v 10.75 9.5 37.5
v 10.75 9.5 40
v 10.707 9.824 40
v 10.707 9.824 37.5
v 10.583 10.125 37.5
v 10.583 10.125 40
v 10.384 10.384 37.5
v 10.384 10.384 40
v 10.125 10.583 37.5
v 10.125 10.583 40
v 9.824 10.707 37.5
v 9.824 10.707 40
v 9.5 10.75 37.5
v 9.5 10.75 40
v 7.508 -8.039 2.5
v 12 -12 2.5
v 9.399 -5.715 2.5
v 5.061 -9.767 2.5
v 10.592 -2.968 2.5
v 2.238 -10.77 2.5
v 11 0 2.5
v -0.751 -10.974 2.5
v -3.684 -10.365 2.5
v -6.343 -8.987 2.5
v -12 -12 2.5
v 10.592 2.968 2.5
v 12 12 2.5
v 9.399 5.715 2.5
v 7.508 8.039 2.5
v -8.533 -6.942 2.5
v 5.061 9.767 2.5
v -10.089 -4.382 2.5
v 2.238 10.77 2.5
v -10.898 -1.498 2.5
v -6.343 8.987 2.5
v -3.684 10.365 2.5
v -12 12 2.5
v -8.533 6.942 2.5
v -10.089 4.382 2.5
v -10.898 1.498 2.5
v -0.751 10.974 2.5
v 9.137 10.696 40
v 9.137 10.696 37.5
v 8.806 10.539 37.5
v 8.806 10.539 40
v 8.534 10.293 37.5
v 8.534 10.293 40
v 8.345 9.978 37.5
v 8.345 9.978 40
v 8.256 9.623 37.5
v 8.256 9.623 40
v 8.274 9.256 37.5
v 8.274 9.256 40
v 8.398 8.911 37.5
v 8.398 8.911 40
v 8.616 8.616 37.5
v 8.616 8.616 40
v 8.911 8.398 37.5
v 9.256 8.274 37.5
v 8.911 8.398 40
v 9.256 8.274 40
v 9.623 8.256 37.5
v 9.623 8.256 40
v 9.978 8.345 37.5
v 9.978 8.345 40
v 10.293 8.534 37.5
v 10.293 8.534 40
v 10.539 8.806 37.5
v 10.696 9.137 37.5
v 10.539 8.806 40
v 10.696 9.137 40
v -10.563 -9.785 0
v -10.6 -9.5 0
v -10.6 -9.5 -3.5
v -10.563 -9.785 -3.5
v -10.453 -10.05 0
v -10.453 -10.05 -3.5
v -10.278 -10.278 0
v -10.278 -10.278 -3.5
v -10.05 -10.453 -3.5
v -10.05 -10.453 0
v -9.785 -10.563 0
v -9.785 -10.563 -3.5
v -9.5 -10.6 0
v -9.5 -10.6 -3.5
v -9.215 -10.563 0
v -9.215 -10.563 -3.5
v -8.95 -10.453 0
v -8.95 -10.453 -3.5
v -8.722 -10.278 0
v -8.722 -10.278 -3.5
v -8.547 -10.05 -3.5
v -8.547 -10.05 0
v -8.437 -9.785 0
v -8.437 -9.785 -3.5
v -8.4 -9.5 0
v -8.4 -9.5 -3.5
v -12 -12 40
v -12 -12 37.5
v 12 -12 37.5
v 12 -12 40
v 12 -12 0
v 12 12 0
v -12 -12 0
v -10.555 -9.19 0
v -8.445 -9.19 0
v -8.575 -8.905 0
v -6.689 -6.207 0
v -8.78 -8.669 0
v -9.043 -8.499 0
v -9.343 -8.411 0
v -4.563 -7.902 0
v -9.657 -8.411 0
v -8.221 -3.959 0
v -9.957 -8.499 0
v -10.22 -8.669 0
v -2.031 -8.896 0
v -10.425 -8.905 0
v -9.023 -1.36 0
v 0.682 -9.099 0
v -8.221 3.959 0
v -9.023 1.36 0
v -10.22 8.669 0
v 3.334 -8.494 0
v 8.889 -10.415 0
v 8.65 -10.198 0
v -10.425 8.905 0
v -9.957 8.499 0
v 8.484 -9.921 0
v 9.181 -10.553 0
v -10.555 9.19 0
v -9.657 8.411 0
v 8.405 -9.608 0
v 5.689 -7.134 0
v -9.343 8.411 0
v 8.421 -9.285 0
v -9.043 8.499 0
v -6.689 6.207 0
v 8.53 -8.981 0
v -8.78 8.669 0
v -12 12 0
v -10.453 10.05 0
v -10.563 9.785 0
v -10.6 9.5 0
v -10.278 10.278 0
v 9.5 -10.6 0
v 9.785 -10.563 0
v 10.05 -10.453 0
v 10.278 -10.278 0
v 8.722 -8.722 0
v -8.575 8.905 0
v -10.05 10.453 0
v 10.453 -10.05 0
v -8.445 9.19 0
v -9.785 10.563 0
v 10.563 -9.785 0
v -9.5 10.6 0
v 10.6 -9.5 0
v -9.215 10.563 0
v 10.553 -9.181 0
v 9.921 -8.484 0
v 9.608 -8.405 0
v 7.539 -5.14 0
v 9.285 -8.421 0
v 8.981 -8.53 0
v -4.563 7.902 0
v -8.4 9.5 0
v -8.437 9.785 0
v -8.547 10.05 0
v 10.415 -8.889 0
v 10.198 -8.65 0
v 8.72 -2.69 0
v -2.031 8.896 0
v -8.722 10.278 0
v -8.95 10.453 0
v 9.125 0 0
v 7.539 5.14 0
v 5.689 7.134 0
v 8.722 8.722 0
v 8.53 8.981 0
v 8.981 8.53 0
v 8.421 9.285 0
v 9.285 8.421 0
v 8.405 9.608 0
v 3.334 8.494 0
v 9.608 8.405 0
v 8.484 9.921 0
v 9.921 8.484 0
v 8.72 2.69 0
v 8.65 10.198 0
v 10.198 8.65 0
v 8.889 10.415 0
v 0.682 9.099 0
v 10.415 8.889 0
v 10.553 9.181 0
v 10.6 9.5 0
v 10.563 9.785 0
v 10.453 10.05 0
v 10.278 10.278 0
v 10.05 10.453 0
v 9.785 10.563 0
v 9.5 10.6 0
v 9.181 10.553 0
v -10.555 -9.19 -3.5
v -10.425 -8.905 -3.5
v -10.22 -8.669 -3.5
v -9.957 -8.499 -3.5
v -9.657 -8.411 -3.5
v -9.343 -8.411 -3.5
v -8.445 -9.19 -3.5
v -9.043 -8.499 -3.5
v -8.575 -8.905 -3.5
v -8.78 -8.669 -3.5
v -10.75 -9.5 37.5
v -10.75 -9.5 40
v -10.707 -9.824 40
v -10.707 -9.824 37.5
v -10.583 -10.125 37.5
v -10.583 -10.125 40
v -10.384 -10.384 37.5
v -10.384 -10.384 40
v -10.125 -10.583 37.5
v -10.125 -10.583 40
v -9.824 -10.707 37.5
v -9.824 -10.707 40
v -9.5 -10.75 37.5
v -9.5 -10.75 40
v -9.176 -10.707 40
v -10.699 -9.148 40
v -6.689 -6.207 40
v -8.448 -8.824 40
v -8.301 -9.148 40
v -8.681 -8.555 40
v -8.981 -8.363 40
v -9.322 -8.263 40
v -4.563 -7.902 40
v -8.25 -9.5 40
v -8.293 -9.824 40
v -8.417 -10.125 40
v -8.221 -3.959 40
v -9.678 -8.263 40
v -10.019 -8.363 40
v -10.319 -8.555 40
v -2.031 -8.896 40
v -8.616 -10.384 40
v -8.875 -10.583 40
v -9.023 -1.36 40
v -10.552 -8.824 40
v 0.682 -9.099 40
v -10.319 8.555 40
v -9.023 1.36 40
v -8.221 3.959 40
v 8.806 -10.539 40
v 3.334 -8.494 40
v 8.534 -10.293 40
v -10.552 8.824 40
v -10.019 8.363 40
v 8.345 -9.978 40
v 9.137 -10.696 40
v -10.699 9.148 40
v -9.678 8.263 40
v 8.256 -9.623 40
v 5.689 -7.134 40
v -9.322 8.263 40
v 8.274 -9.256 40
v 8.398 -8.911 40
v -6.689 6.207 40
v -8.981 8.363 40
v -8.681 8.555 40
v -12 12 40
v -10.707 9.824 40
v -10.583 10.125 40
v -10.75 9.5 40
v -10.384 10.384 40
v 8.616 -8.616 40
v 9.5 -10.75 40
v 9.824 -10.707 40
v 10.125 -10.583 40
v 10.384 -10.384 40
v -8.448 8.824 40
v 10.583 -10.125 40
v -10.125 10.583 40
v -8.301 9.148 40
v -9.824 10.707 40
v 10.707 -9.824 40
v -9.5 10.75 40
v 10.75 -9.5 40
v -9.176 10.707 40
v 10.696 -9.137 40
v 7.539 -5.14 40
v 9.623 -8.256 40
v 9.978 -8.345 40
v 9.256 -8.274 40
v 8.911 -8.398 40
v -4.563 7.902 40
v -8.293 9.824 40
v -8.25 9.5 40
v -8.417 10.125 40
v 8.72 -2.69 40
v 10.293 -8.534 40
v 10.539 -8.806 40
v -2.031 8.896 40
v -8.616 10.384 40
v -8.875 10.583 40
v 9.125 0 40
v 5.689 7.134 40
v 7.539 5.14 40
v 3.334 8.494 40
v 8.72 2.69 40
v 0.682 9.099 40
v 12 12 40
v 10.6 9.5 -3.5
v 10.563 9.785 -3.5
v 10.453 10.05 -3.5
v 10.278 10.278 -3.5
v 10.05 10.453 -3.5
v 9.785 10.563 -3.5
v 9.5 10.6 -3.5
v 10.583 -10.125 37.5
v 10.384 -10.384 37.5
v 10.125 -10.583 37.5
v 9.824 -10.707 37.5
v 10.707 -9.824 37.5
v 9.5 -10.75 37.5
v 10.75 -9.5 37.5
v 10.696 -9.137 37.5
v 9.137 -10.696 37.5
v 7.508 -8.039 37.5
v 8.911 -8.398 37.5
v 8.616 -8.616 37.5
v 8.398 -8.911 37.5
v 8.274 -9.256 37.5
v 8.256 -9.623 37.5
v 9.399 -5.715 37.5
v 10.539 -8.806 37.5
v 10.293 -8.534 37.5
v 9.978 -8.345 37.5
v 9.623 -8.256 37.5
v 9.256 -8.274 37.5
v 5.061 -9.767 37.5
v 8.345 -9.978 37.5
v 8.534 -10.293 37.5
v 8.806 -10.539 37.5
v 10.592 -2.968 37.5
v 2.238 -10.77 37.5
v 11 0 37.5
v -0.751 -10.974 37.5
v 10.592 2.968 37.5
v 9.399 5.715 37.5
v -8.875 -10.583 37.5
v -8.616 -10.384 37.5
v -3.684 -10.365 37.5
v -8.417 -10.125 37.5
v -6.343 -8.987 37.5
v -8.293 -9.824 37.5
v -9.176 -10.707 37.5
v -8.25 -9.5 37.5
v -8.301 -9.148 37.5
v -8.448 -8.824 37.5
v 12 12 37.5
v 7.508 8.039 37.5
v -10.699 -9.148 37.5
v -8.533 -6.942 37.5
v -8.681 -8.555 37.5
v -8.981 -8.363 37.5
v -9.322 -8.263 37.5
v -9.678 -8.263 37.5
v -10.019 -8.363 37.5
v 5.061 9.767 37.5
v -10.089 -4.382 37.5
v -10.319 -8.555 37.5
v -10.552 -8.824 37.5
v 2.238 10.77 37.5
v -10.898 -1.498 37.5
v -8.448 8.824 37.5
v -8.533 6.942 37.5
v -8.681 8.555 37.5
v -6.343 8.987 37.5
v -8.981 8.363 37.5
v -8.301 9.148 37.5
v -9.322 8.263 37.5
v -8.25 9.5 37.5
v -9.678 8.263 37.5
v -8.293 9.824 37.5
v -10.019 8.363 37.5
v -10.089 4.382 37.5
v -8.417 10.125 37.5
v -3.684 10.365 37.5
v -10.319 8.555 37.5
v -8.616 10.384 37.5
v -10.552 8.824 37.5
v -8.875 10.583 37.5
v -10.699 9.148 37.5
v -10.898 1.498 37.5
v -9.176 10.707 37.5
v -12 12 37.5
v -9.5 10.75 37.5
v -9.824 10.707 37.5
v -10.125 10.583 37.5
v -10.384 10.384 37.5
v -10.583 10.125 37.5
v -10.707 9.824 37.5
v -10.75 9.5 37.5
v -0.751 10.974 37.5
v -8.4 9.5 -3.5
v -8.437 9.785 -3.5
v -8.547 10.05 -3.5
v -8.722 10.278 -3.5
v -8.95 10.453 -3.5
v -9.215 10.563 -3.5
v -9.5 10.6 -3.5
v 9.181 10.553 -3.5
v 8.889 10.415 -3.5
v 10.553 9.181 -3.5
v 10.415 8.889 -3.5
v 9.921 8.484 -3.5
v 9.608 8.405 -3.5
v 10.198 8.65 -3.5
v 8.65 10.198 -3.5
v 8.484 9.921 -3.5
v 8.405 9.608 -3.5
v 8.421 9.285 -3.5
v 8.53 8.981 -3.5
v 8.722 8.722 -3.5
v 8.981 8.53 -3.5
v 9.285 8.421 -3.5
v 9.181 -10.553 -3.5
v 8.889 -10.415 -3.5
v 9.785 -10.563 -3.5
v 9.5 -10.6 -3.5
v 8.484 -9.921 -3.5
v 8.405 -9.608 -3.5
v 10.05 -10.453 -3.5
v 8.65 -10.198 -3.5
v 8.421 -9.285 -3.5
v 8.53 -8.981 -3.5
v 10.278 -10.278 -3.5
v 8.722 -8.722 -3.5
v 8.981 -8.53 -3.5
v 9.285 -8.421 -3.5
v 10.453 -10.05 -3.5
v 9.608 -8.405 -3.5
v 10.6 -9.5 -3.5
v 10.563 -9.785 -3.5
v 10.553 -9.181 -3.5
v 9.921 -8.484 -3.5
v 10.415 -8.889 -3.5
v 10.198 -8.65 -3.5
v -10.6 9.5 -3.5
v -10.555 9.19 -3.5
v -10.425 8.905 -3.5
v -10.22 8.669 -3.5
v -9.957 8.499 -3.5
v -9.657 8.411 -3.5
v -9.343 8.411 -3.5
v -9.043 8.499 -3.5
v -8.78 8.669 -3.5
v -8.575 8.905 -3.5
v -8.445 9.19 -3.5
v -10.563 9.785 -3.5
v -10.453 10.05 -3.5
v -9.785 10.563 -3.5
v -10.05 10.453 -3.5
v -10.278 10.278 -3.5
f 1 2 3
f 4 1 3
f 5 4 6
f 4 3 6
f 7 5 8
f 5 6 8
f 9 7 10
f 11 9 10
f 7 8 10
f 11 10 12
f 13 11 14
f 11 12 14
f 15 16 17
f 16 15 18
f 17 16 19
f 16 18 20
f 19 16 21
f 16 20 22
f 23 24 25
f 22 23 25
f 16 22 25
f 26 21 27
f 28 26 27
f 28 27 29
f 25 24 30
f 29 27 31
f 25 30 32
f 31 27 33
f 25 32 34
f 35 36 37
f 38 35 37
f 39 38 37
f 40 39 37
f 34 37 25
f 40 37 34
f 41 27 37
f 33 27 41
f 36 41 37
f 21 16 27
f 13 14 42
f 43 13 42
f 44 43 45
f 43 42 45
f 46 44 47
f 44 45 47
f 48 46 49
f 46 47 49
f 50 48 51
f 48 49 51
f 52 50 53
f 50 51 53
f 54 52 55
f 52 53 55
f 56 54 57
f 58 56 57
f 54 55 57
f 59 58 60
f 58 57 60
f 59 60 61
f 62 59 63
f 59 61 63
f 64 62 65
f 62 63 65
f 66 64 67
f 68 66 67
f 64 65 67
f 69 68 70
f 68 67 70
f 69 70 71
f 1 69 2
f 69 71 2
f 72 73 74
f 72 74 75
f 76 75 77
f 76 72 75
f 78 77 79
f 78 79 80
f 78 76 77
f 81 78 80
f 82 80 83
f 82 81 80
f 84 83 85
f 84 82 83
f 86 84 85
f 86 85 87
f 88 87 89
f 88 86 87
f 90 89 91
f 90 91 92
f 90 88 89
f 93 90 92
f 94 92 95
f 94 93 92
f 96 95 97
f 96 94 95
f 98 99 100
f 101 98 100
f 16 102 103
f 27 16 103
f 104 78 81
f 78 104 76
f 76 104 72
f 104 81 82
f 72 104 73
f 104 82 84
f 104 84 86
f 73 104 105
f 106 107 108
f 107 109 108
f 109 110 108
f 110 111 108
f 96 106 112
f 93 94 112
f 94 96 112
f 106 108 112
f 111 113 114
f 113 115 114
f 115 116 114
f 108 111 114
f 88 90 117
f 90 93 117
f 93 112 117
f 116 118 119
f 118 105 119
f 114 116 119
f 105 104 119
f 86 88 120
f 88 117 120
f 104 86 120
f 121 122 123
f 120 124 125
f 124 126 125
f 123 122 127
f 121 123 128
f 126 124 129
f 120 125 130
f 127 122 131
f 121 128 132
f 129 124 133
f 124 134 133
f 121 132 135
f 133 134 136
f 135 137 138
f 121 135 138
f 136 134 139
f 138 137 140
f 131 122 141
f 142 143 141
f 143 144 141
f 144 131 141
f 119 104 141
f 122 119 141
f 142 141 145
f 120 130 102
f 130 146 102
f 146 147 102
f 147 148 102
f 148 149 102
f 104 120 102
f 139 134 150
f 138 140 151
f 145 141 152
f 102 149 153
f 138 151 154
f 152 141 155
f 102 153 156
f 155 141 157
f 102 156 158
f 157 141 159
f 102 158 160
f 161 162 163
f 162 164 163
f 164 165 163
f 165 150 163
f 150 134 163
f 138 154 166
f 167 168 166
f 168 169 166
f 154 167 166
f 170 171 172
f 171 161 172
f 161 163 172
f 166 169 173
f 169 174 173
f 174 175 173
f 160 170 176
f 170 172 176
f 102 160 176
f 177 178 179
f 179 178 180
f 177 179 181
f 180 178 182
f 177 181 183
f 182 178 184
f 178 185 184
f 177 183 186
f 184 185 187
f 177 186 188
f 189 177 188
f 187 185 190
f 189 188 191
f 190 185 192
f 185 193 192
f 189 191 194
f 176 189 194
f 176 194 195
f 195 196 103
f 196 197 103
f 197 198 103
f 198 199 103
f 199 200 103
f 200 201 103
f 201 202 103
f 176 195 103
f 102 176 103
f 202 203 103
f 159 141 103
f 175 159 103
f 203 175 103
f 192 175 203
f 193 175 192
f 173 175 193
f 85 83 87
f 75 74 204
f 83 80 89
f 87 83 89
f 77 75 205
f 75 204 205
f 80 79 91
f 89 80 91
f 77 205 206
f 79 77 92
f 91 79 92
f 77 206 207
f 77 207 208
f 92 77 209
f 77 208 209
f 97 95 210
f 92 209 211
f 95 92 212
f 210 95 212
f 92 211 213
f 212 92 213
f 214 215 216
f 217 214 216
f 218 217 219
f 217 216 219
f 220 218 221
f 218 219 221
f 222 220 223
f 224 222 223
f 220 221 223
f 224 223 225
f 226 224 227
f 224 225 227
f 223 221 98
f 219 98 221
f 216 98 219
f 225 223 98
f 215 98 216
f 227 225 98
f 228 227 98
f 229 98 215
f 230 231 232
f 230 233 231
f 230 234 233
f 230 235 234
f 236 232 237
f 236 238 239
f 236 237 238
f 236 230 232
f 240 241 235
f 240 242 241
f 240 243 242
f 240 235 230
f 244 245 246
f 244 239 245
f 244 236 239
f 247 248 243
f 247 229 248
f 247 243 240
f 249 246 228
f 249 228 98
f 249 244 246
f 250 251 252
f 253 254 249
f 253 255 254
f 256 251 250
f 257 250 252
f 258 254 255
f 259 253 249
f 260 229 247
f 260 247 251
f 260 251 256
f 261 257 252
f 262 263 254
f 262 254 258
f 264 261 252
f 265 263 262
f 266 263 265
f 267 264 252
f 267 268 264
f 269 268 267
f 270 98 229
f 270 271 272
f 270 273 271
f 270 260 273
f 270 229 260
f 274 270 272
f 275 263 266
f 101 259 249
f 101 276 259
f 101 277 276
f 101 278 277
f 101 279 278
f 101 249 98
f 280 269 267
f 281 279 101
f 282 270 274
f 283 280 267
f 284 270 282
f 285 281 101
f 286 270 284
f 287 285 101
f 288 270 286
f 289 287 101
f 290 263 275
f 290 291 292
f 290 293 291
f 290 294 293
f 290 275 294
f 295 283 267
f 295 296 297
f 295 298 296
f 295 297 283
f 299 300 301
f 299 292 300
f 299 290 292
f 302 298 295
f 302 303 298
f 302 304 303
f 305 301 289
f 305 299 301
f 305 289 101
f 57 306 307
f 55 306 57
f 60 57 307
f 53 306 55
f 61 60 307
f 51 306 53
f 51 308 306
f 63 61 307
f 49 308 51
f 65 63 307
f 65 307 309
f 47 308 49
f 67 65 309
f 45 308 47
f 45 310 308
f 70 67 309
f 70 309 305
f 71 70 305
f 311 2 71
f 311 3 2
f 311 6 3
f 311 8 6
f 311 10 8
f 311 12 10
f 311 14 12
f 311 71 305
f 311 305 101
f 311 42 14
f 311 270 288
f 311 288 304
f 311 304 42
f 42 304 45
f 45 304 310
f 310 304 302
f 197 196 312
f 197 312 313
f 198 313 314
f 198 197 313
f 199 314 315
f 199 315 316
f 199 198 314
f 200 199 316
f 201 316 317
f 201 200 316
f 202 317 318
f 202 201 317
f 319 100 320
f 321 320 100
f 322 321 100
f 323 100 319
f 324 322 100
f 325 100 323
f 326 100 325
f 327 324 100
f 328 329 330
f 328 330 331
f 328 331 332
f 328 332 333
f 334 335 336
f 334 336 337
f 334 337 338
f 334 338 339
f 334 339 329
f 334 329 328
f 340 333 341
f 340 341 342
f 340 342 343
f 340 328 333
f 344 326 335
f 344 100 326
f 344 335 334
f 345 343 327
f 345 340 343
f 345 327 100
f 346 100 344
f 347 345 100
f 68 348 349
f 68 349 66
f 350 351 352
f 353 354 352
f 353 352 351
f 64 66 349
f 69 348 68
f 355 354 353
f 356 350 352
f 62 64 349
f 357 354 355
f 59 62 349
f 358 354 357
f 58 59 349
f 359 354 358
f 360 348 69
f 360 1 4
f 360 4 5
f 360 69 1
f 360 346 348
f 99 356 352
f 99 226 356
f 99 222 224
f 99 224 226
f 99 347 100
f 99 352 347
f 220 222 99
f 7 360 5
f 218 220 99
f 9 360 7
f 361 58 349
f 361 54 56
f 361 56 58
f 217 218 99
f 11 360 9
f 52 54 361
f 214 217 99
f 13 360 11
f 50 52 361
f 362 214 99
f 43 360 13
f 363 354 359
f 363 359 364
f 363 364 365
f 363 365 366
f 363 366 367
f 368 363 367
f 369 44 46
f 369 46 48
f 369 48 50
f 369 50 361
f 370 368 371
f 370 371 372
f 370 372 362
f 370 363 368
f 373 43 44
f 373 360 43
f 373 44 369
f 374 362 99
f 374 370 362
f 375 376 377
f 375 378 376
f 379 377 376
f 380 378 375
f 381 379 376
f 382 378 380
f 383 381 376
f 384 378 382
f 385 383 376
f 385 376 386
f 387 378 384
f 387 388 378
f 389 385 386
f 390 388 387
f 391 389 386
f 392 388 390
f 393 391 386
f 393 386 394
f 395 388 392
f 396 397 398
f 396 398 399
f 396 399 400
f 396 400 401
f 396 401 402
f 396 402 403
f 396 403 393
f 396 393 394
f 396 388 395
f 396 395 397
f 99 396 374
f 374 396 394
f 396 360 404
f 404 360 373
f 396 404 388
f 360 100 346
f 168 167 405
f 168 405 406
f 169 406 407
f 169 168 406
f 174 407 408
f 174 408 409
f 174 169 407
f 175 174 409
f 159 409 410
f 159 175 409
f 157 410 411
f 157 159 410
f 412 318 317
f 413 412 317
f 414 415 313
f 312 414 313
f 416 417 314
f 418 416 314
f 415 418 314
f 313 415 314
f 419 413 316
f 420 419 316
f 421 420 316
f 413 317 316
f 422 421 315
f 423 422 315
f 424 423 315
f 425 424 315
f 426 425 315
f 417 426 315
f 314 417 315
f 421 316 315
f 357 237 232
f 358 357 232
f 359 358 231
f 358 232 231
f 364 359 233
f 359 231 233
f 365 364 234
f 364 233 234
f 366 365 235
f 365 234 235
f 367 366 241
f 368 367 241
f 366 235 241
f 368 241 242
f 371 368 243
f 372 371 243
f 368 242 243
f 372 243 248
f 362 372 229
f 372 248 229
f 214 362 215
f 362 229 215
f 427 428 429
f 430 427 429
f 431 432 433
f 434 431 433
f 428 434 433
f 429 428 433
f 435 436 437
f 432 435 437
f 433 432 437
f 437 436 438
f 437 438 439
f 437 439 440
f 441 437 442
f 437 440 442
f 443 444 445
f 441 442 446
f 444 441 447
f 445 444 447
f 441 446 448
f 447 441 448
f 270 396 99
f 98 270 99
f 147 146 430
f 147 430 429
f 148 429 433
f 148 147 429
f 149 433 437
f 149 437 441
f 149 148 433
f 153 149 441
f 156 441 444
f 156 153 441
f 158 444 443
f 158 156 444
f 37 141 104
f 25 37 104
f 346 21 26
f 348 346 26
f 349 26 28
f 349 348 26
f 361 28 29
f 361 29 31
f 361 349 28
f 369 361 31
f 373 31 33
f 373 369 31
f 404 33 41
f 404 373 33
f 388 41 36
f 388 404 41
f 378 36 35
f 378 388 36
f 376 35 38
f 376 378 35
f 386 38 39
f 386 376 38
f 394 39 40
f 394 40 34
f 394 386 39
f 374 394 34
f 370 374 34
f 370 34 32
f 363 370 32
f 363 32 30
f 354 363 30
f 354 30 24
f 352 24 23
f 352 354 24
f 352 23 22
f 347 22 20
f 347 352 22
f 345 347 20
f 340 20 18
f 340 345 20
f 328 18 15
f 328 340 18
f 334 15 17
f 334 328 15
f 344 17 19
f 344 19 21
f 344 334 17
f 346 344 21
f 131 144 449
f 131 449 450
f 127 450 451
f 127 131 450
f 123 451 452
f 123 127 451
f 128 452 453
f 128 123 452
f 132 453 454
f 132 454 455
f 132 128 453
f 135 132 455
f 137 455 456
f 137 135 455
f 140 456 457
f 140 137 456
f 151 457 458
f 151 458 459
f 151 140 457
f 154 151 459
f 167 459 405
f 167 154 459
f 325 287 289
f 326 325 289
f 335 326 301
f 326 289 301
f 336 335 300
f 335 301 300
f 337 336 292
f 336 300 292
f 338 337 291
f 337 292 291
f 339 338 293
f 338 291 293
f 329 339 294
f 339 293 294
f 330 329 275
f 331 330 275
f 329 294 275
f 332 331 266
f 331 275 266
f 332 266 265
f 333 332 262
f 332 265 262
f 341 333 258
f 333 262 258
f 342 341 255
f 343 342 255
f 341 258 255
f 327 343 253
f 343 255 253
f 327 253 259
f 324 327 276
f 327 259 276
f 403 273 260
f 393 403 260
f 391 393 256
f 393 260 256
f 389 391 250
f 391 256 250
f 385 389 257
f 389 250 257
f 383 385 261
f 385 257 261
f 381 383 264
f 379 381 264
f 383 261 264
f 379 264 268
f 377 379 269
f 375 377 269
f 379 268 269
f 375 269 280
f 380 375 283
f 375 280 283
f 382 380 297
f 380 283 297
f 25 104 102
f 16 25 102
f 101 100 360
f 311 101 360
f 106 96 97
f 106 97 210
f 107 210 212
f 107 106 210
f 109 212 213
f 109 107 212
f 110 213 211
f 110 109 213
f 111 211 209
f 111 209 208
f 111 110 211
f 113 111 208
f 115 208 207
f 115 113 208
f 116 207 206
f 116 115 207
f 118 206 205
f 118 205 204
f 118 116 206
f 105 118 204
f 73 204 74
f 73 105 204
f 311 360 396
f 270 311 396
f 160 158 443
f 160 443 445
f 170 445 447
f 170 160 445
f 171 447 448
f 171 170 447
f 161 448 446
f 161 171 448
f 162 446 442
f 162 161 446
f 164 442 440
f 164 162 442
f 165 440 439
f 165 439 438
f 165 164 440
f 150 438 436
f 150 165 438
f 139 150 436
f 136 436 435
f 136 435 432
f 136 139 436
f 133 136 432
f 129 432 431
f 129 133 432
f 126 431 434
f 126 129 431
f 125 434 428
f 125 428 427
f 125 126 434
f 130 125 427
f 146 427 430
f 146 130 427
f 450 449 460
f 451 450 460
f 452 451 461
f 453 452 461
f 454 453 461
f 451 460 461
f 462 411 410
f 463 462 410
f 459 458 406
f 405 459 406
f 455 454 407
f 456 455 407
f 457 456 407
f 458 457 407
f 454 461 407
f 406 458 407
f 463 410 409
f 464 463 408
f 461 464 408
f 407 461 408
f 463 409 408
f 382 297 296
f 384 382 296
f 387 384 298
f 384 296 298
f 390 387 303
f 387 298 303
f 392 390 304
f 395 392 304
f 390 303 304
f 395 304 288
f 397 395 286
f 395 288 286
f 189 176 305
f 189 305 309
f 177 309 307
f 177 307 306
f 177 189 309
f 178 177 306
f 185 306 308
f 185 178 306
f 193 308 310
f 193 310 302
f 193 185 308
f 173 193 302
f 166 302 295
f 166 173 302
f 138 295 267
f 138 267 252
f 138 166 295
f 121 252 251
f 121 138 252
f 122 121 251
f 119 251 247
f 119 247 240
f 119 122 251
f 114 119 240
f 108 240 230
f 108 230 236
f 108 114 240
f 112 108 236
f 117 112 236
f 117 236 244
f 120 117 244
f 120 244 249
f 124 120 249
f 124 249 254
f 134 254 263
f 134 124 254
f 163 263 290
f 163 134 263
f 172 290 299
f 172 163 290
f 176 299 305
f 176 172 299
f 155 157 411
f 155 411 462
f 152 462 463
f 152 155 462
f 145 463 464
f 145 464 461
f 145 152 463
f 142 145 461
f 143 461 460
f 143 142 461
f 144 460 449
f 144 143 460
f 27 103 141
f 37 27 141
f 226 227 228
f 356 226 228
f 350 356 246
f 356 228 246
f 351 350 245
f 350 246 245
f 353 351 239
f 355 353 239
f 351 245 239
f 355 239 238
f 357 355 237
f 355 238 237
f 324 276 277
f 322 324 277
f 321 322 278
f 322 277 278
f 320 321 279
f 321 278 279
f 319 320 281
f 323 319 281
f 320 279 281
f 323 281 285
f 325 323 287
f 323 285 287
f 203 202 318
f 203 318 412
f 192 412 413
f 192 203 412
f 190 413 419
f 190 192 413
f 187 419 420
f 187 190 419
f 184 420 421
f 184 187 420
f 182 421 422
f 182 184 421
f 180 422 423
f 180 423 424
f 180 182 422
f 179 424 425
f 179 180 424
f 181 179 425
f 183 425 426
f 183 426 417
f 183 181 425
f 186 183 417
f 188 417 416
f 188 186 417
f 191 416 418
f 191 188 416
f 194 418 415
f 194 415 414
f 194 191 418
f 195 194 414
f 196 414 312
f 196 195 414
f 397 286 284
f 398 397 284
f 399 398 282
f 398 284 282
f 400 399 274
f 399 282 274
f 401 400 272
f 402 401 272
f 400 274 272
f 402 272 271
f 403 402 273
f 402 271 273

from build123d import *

# Parameters (mm, degrees)
F0_R     = 10.5
F0_R_2   = 9.125
F1_DEPTH = 40
F2_W     = 6
F2_H     = 35
F4_DEPTH = 3.5
F6_DEPTH = 25


with BuildPart() as f1:
    # F0 (on Top) → F1 (new body)
    with BuildSketch(Plane.XY):
        with BuildLine():
            Line((9.5, 10.6), (9.5, 12))
            Line((9.5, 12), (-9.5, 12))
            Line((-9.5, 12), (-9.5, 10.6))
            ThreePointArc((-9.5, 10.6), (-8.722183, 10.277817), (-8.4, 9.5))
            ThreePointArc((-8.4, 9.5), (-9.5, 8.4), (-10.6, 9.5))
            Line((-10.6, 9.5), (-12, 9.5))
            Line((-12, 9.5), (-12, -9.5))
            Line((-12, -9.5), (-10.6, -9.5))
            ThreePointArc((-10.6, -9.5), (-9.5, -8.4), (-8.4, -9.5))
            ThreePointArc((-8.4, -9.5), (-8.722183, -10.277817), (-9.5, -10.6))
            Line((-9.5, -10.6), (-9.5, -12))
            Line((-9.5, -12), (9.5, -12))
            Line((9.5, -12), (9.5, -10.6))
            ThreePointArc((9.5, -10.6), (8.722183, -8.722183), (10.6, -9.5))
            Line((10.6, -9.5), (12, -9.5))
            Line((12, -9.5), (12, 9.5))
            Line((12, 9.5), (10.6, 9.5))
            ThreePointArc((10.6, 9.5), (8.722183, 8.722183), (9.5, 10.6))
        make_face()
        Circle(F0_R, mode=Mode.SUBTRACT)
        Circle(F0_R)
        Circle(F0_R_2, mode=Mode.SUBTRACT)
        with BuildLine():
            Line((12, -12), (12, -9.5))
            Line((12, -9.5), (10.6, -9.5))
            ThreePointArc((10.6, -9.5), (10.277817, -10.277817), (9.5, -10.6))
            Line((9.5, -10.6), (9.5, -12))
            Line((9.5, -12), (12, -12))
        make_face()
        with BuildLine():
            Line((-10.6, -9.5), (-12, -9.5))
            Line((-12, -9.5), (-12, -12))
            Line((-12, -12), (-9.5, -12))
            Line((-9.5, -12), (-9.5, -10.6))
            ThreePointArc((-9.5, -10.6), (-10.277817, -10.277817), (-10.6, -9.5))
        make_face()
        with BuildLine():
            Line((-9.5, 10.6), (-9.5, 12))
            Line((-9.5, 12), (-12, 12))
            Line((-12, 12), (-12, 9.5))
            Line((-12, 9.5), (-10.6, 9.5))
            ThreePointArc((-10.6, 9.5), (-10.277817, 10.277817), (-9.5, 10.6))
        make_face()
        with BuildLine():
            Line((12, 9.5), (12, 12))
            Line((12, 12), (9.5, 12))
            Line((9.5, 12), (9.5, 10.6))
            ThreePointArc((9.5, 10.6), (10.277817, 10.277817), (10.6, 9.5))
            Line((10.6, 9.5), (12, 9.5))
        make_face()
        with BuildLine():
            Line((9.5, 9.5), (9.5, 10.6))
            ThreePointArc((9.5, 10.6), (8.722183, 8.722183), (10.6, 9.5))
            Line((10.6, 9.5), (9.5, 9.5))
        make_face()
        with BuildLine():
            ThreePointArc((10.6, 9.5), (10.277817, 10.277817), (9.5, 10.6))
            Line((9.5, 10.6), (9.5, 9.5))
            Line((9.5, 9.5), (10.6, 9.5))
        make_face()
        with BuildLine():
            Line((9.5, -9.5), (10.6, -9.5))
            ThreePointArc((10.6, -9.5), (8.722183, -8.722183), (9.5, -10.6))
            Line((9.5, -10.6), (9.5, -9.5))
        make_face()
        with BuildLine():
            ThreePointArc((9.5, -10.6), (10.277817, -10.277817), (10.6, -9.5))
            Line((10.6, -9.5), (9.5, -9.5))
            Line((9.5, -9.5), (9.5, -10.6))
        make_face()
        with BuildLine():
            Line((-9.5, -9.5), (-10.6, -9.5))
            ThreePointArc((-10.6, -9.5), (-10.277817, -10.277817), (-9.5, -10.6))
            Line((-9.5, -10.6), (-9.5, -9.5))
        make_face()
        with BuildLine():
            ThreePointArc((-8.4, -9.5), (-9.5, -8.4), (-10.6, -9.5))
            Line((-10.6, -9.5), (-9.5, -9.5))
            Line((-9.5, -9.5), (-9.5, -10.6))
            ThreePointArc((-9.5, -10.6), (-8.722183, -10.277817), (-8.4, -9.5))
        make_face()
        with BuildLine():
            ThreePointArc((-8.4, 9.5), (-8.722183, 10.277817), (-9.5, 10.6))
            Line((-9.5, 10.6), (-9.5, 9.5))
            Line((-9.5, 9.5), (-10.6, 9.5))
            ThreePointArc((-10.6, 9.5), (-9.5, 8.4), (-8.4, 9.5))
        make_face()
        with BuildLine():
            Line((-9.5, 9.5), (-9.5, 10.6))
            ThreePointArc((-9.5, 10.6), (-10.277817, 10.277817), (-10.6, 9.5))
            Line((-10.6, 9.5), (-9.5, 9.5))
        make_face()
    extrude(amount=F1_DEPTH)

    # F2 (on Front) → F3 (revolve, cut)
    with BuildSketch(Plane.XZ):
        with Locations((14, 20)):
            Rectangle(F2_W, F2_H)
    revolve(axis=Axis((0, 0, 16.744209), (0, 0, 1)), mode=Mode.SUBTRACT)

    # F0 (on Top) → F4 (join)
    with BuildSketch(Plane.XY):
        with BuildLine():
            Line((-9.5, 9.5), (-9.5, 10.6))
            ThreePointArc((-9.5, 10.6), (-10.277817, 10.277817), (-10.6, 9.5))
            Line((-10.6, 9.5), (-9.5, 9.5))
        make_face()
        with BuildLine():
            ThreePointArc((-8.4, 9.5), (-8.722183, 10.277817), (-9.5, 10.6))
            Line((-9.5, 10.6), (-9.5, 9.5))
            Line((-9.5, 9.5), (-10.6, 9.5))
            ThreePointArc((-10.6, 9.5), (-9.5, 8.4), (-8.4, 9.5))
        make_face()
        with BuildLine():
            Line((-9.5, -9.5), (-10.6, -9.5))
            ThreePointArc((-10.6, -9.5), (-10.277817, -10.277817), (-9.5, -10.6))
            Line((-9.5, -10.6), (-9.5, -9.5))
        make_face()
        with BuildLine():
            ThreePointArc((-8.4, -9.5), (-9.5, -8.4), (-10.6, -9.5))
            Line((-10.6, -9.5), (-9.5, -9.5))
            Line((-9.5, -9.5), (-9.5, -10.6))
            ThreePointArc((-9.5, -10.6), (-8.722183, -10.277817), (-8.4, -9.5))
        make_face()
        with BuildLine():
            Line((9.5, -9.5), (10.6, -9.5))
            ThreePointArc((10.6, -9.5), (8.722183, -8.722183), (9.5, -10.6))
            Line((9.5, -10.6), (9.5, -9.5))
        make_face()
        with BuildLine():
            ThreePointArc((9.5, -10.6), (10.277817, -10.277817), (10.6, -9.5))
            Line((10.6, -9.5), (9.5, -9.5))
            Line((9.5, -9.5), (9.5, -10.6))
        make_face()
        with BuildLine():
            Line((9.5, 9.5), (9.5, 10.6))
            ThreePointArc((9.5, 10.6), (8.722183, 8.722183), (10.6, 9.5))
            Line((10.6, 9.5), (9.5, 9.5))
        make_face()
        with BuildLine():
            ThreePointArc((10.6, 9.5), (10.277817, 10.277817), (9.5, 10.6))
            Line((9.5, 10.6), (9.5, 9.5))
            Line((9.5, 9.5), (10.6, 9.5))
        make_face()
    extrude(amount=-F4_DEPTH)

    # F5 (on face) → F6 (cut)
    with BuildSketch(Plane.XY.offset(40)):
        with BuildLine():
            Line((9.5, -9.5), (10.75, -9.5))
            ThreePointArc((10.75, -9.5), (8.616117, -8.616117), (9.5, -10.75))
            Line((9.5, -10.75), (9.5, -9.5))
        make_face()
        with BuildLine():
            ThreePointArc((9.5, -10.75), (10.383883, -10.383883), (10.75, -9.5))
            Line((10.75, -9.5), (9.5, -9.5))
            Line((9.5, -9.5), (9.5, -10.75))
        make_face()
        with BuildLine():
            Line((-9.5, 9.5), (-9.5, 10.75))
            ThreePointArc((-9.5, 10.75), (-10.383883, 10.383883), (-10.75, 9.5))
            Line((-10.75, 9.5), (-9.5, 9.5))
        make_face()
        with BuildLine():
            ThreePointArc((-8.25, -9.5), (-9.5, -8.25), (-10.75, -9.5))
            Line((-10.75, -9.5), (-9.5, -9.5))
            Line((-9.5, -9.5), (-9.5, -10.75))
            ThreePointArc((-9.5, -10.75), (-8.616117, -10.383883), (-8.25, -9.5))
        make_face()
        with BuildLine():
            Line((-9.5, -9.5), (-10.75, -9.5))
            ThreePointArc((-10.75, -9.5), (-10.383883, -10.383883), (-9.5, -10.75))
            Line((-9.5, -10.75), (-9.5, -9.5))
        make_face()
        with BuildLine():
            ThreePointArc((-8.25, 9.5), (-8.616117, 10.383883), (-9.5, 10.75))
            Line((-9.5, 10.75), (-9.5, 9.5))
            Line((-9.5, 9.5), (-10.75, 9.5))
            ThreePointArc((-10.75, 9.5), (-9.5, 8.25), (-8.25, 9.5))
        make_face()
        with BuildLine():
            Line((9.5, 9.5), (9.5, 10.75))
            ThreePointArc((9.5, 10.75), (8.616117, 8.616117), (10.75, 9.5))
            Line((10.75, 9.5), (9.5, 9.5))
        make_face()
        with BuildLine():
            ThreePointArc((10.75, 9.5), (10.383883, 10.383883), (9.5, 10.75))
            Line((9.5, 10.75), (9.5, 9.5))
            Line((9.5, 9.5), (10.75, 9.5))
        make_face()
    extrude(amount=-F6_DEPTH, mode=Mode.SUBTRACT)


solid = f1.part
